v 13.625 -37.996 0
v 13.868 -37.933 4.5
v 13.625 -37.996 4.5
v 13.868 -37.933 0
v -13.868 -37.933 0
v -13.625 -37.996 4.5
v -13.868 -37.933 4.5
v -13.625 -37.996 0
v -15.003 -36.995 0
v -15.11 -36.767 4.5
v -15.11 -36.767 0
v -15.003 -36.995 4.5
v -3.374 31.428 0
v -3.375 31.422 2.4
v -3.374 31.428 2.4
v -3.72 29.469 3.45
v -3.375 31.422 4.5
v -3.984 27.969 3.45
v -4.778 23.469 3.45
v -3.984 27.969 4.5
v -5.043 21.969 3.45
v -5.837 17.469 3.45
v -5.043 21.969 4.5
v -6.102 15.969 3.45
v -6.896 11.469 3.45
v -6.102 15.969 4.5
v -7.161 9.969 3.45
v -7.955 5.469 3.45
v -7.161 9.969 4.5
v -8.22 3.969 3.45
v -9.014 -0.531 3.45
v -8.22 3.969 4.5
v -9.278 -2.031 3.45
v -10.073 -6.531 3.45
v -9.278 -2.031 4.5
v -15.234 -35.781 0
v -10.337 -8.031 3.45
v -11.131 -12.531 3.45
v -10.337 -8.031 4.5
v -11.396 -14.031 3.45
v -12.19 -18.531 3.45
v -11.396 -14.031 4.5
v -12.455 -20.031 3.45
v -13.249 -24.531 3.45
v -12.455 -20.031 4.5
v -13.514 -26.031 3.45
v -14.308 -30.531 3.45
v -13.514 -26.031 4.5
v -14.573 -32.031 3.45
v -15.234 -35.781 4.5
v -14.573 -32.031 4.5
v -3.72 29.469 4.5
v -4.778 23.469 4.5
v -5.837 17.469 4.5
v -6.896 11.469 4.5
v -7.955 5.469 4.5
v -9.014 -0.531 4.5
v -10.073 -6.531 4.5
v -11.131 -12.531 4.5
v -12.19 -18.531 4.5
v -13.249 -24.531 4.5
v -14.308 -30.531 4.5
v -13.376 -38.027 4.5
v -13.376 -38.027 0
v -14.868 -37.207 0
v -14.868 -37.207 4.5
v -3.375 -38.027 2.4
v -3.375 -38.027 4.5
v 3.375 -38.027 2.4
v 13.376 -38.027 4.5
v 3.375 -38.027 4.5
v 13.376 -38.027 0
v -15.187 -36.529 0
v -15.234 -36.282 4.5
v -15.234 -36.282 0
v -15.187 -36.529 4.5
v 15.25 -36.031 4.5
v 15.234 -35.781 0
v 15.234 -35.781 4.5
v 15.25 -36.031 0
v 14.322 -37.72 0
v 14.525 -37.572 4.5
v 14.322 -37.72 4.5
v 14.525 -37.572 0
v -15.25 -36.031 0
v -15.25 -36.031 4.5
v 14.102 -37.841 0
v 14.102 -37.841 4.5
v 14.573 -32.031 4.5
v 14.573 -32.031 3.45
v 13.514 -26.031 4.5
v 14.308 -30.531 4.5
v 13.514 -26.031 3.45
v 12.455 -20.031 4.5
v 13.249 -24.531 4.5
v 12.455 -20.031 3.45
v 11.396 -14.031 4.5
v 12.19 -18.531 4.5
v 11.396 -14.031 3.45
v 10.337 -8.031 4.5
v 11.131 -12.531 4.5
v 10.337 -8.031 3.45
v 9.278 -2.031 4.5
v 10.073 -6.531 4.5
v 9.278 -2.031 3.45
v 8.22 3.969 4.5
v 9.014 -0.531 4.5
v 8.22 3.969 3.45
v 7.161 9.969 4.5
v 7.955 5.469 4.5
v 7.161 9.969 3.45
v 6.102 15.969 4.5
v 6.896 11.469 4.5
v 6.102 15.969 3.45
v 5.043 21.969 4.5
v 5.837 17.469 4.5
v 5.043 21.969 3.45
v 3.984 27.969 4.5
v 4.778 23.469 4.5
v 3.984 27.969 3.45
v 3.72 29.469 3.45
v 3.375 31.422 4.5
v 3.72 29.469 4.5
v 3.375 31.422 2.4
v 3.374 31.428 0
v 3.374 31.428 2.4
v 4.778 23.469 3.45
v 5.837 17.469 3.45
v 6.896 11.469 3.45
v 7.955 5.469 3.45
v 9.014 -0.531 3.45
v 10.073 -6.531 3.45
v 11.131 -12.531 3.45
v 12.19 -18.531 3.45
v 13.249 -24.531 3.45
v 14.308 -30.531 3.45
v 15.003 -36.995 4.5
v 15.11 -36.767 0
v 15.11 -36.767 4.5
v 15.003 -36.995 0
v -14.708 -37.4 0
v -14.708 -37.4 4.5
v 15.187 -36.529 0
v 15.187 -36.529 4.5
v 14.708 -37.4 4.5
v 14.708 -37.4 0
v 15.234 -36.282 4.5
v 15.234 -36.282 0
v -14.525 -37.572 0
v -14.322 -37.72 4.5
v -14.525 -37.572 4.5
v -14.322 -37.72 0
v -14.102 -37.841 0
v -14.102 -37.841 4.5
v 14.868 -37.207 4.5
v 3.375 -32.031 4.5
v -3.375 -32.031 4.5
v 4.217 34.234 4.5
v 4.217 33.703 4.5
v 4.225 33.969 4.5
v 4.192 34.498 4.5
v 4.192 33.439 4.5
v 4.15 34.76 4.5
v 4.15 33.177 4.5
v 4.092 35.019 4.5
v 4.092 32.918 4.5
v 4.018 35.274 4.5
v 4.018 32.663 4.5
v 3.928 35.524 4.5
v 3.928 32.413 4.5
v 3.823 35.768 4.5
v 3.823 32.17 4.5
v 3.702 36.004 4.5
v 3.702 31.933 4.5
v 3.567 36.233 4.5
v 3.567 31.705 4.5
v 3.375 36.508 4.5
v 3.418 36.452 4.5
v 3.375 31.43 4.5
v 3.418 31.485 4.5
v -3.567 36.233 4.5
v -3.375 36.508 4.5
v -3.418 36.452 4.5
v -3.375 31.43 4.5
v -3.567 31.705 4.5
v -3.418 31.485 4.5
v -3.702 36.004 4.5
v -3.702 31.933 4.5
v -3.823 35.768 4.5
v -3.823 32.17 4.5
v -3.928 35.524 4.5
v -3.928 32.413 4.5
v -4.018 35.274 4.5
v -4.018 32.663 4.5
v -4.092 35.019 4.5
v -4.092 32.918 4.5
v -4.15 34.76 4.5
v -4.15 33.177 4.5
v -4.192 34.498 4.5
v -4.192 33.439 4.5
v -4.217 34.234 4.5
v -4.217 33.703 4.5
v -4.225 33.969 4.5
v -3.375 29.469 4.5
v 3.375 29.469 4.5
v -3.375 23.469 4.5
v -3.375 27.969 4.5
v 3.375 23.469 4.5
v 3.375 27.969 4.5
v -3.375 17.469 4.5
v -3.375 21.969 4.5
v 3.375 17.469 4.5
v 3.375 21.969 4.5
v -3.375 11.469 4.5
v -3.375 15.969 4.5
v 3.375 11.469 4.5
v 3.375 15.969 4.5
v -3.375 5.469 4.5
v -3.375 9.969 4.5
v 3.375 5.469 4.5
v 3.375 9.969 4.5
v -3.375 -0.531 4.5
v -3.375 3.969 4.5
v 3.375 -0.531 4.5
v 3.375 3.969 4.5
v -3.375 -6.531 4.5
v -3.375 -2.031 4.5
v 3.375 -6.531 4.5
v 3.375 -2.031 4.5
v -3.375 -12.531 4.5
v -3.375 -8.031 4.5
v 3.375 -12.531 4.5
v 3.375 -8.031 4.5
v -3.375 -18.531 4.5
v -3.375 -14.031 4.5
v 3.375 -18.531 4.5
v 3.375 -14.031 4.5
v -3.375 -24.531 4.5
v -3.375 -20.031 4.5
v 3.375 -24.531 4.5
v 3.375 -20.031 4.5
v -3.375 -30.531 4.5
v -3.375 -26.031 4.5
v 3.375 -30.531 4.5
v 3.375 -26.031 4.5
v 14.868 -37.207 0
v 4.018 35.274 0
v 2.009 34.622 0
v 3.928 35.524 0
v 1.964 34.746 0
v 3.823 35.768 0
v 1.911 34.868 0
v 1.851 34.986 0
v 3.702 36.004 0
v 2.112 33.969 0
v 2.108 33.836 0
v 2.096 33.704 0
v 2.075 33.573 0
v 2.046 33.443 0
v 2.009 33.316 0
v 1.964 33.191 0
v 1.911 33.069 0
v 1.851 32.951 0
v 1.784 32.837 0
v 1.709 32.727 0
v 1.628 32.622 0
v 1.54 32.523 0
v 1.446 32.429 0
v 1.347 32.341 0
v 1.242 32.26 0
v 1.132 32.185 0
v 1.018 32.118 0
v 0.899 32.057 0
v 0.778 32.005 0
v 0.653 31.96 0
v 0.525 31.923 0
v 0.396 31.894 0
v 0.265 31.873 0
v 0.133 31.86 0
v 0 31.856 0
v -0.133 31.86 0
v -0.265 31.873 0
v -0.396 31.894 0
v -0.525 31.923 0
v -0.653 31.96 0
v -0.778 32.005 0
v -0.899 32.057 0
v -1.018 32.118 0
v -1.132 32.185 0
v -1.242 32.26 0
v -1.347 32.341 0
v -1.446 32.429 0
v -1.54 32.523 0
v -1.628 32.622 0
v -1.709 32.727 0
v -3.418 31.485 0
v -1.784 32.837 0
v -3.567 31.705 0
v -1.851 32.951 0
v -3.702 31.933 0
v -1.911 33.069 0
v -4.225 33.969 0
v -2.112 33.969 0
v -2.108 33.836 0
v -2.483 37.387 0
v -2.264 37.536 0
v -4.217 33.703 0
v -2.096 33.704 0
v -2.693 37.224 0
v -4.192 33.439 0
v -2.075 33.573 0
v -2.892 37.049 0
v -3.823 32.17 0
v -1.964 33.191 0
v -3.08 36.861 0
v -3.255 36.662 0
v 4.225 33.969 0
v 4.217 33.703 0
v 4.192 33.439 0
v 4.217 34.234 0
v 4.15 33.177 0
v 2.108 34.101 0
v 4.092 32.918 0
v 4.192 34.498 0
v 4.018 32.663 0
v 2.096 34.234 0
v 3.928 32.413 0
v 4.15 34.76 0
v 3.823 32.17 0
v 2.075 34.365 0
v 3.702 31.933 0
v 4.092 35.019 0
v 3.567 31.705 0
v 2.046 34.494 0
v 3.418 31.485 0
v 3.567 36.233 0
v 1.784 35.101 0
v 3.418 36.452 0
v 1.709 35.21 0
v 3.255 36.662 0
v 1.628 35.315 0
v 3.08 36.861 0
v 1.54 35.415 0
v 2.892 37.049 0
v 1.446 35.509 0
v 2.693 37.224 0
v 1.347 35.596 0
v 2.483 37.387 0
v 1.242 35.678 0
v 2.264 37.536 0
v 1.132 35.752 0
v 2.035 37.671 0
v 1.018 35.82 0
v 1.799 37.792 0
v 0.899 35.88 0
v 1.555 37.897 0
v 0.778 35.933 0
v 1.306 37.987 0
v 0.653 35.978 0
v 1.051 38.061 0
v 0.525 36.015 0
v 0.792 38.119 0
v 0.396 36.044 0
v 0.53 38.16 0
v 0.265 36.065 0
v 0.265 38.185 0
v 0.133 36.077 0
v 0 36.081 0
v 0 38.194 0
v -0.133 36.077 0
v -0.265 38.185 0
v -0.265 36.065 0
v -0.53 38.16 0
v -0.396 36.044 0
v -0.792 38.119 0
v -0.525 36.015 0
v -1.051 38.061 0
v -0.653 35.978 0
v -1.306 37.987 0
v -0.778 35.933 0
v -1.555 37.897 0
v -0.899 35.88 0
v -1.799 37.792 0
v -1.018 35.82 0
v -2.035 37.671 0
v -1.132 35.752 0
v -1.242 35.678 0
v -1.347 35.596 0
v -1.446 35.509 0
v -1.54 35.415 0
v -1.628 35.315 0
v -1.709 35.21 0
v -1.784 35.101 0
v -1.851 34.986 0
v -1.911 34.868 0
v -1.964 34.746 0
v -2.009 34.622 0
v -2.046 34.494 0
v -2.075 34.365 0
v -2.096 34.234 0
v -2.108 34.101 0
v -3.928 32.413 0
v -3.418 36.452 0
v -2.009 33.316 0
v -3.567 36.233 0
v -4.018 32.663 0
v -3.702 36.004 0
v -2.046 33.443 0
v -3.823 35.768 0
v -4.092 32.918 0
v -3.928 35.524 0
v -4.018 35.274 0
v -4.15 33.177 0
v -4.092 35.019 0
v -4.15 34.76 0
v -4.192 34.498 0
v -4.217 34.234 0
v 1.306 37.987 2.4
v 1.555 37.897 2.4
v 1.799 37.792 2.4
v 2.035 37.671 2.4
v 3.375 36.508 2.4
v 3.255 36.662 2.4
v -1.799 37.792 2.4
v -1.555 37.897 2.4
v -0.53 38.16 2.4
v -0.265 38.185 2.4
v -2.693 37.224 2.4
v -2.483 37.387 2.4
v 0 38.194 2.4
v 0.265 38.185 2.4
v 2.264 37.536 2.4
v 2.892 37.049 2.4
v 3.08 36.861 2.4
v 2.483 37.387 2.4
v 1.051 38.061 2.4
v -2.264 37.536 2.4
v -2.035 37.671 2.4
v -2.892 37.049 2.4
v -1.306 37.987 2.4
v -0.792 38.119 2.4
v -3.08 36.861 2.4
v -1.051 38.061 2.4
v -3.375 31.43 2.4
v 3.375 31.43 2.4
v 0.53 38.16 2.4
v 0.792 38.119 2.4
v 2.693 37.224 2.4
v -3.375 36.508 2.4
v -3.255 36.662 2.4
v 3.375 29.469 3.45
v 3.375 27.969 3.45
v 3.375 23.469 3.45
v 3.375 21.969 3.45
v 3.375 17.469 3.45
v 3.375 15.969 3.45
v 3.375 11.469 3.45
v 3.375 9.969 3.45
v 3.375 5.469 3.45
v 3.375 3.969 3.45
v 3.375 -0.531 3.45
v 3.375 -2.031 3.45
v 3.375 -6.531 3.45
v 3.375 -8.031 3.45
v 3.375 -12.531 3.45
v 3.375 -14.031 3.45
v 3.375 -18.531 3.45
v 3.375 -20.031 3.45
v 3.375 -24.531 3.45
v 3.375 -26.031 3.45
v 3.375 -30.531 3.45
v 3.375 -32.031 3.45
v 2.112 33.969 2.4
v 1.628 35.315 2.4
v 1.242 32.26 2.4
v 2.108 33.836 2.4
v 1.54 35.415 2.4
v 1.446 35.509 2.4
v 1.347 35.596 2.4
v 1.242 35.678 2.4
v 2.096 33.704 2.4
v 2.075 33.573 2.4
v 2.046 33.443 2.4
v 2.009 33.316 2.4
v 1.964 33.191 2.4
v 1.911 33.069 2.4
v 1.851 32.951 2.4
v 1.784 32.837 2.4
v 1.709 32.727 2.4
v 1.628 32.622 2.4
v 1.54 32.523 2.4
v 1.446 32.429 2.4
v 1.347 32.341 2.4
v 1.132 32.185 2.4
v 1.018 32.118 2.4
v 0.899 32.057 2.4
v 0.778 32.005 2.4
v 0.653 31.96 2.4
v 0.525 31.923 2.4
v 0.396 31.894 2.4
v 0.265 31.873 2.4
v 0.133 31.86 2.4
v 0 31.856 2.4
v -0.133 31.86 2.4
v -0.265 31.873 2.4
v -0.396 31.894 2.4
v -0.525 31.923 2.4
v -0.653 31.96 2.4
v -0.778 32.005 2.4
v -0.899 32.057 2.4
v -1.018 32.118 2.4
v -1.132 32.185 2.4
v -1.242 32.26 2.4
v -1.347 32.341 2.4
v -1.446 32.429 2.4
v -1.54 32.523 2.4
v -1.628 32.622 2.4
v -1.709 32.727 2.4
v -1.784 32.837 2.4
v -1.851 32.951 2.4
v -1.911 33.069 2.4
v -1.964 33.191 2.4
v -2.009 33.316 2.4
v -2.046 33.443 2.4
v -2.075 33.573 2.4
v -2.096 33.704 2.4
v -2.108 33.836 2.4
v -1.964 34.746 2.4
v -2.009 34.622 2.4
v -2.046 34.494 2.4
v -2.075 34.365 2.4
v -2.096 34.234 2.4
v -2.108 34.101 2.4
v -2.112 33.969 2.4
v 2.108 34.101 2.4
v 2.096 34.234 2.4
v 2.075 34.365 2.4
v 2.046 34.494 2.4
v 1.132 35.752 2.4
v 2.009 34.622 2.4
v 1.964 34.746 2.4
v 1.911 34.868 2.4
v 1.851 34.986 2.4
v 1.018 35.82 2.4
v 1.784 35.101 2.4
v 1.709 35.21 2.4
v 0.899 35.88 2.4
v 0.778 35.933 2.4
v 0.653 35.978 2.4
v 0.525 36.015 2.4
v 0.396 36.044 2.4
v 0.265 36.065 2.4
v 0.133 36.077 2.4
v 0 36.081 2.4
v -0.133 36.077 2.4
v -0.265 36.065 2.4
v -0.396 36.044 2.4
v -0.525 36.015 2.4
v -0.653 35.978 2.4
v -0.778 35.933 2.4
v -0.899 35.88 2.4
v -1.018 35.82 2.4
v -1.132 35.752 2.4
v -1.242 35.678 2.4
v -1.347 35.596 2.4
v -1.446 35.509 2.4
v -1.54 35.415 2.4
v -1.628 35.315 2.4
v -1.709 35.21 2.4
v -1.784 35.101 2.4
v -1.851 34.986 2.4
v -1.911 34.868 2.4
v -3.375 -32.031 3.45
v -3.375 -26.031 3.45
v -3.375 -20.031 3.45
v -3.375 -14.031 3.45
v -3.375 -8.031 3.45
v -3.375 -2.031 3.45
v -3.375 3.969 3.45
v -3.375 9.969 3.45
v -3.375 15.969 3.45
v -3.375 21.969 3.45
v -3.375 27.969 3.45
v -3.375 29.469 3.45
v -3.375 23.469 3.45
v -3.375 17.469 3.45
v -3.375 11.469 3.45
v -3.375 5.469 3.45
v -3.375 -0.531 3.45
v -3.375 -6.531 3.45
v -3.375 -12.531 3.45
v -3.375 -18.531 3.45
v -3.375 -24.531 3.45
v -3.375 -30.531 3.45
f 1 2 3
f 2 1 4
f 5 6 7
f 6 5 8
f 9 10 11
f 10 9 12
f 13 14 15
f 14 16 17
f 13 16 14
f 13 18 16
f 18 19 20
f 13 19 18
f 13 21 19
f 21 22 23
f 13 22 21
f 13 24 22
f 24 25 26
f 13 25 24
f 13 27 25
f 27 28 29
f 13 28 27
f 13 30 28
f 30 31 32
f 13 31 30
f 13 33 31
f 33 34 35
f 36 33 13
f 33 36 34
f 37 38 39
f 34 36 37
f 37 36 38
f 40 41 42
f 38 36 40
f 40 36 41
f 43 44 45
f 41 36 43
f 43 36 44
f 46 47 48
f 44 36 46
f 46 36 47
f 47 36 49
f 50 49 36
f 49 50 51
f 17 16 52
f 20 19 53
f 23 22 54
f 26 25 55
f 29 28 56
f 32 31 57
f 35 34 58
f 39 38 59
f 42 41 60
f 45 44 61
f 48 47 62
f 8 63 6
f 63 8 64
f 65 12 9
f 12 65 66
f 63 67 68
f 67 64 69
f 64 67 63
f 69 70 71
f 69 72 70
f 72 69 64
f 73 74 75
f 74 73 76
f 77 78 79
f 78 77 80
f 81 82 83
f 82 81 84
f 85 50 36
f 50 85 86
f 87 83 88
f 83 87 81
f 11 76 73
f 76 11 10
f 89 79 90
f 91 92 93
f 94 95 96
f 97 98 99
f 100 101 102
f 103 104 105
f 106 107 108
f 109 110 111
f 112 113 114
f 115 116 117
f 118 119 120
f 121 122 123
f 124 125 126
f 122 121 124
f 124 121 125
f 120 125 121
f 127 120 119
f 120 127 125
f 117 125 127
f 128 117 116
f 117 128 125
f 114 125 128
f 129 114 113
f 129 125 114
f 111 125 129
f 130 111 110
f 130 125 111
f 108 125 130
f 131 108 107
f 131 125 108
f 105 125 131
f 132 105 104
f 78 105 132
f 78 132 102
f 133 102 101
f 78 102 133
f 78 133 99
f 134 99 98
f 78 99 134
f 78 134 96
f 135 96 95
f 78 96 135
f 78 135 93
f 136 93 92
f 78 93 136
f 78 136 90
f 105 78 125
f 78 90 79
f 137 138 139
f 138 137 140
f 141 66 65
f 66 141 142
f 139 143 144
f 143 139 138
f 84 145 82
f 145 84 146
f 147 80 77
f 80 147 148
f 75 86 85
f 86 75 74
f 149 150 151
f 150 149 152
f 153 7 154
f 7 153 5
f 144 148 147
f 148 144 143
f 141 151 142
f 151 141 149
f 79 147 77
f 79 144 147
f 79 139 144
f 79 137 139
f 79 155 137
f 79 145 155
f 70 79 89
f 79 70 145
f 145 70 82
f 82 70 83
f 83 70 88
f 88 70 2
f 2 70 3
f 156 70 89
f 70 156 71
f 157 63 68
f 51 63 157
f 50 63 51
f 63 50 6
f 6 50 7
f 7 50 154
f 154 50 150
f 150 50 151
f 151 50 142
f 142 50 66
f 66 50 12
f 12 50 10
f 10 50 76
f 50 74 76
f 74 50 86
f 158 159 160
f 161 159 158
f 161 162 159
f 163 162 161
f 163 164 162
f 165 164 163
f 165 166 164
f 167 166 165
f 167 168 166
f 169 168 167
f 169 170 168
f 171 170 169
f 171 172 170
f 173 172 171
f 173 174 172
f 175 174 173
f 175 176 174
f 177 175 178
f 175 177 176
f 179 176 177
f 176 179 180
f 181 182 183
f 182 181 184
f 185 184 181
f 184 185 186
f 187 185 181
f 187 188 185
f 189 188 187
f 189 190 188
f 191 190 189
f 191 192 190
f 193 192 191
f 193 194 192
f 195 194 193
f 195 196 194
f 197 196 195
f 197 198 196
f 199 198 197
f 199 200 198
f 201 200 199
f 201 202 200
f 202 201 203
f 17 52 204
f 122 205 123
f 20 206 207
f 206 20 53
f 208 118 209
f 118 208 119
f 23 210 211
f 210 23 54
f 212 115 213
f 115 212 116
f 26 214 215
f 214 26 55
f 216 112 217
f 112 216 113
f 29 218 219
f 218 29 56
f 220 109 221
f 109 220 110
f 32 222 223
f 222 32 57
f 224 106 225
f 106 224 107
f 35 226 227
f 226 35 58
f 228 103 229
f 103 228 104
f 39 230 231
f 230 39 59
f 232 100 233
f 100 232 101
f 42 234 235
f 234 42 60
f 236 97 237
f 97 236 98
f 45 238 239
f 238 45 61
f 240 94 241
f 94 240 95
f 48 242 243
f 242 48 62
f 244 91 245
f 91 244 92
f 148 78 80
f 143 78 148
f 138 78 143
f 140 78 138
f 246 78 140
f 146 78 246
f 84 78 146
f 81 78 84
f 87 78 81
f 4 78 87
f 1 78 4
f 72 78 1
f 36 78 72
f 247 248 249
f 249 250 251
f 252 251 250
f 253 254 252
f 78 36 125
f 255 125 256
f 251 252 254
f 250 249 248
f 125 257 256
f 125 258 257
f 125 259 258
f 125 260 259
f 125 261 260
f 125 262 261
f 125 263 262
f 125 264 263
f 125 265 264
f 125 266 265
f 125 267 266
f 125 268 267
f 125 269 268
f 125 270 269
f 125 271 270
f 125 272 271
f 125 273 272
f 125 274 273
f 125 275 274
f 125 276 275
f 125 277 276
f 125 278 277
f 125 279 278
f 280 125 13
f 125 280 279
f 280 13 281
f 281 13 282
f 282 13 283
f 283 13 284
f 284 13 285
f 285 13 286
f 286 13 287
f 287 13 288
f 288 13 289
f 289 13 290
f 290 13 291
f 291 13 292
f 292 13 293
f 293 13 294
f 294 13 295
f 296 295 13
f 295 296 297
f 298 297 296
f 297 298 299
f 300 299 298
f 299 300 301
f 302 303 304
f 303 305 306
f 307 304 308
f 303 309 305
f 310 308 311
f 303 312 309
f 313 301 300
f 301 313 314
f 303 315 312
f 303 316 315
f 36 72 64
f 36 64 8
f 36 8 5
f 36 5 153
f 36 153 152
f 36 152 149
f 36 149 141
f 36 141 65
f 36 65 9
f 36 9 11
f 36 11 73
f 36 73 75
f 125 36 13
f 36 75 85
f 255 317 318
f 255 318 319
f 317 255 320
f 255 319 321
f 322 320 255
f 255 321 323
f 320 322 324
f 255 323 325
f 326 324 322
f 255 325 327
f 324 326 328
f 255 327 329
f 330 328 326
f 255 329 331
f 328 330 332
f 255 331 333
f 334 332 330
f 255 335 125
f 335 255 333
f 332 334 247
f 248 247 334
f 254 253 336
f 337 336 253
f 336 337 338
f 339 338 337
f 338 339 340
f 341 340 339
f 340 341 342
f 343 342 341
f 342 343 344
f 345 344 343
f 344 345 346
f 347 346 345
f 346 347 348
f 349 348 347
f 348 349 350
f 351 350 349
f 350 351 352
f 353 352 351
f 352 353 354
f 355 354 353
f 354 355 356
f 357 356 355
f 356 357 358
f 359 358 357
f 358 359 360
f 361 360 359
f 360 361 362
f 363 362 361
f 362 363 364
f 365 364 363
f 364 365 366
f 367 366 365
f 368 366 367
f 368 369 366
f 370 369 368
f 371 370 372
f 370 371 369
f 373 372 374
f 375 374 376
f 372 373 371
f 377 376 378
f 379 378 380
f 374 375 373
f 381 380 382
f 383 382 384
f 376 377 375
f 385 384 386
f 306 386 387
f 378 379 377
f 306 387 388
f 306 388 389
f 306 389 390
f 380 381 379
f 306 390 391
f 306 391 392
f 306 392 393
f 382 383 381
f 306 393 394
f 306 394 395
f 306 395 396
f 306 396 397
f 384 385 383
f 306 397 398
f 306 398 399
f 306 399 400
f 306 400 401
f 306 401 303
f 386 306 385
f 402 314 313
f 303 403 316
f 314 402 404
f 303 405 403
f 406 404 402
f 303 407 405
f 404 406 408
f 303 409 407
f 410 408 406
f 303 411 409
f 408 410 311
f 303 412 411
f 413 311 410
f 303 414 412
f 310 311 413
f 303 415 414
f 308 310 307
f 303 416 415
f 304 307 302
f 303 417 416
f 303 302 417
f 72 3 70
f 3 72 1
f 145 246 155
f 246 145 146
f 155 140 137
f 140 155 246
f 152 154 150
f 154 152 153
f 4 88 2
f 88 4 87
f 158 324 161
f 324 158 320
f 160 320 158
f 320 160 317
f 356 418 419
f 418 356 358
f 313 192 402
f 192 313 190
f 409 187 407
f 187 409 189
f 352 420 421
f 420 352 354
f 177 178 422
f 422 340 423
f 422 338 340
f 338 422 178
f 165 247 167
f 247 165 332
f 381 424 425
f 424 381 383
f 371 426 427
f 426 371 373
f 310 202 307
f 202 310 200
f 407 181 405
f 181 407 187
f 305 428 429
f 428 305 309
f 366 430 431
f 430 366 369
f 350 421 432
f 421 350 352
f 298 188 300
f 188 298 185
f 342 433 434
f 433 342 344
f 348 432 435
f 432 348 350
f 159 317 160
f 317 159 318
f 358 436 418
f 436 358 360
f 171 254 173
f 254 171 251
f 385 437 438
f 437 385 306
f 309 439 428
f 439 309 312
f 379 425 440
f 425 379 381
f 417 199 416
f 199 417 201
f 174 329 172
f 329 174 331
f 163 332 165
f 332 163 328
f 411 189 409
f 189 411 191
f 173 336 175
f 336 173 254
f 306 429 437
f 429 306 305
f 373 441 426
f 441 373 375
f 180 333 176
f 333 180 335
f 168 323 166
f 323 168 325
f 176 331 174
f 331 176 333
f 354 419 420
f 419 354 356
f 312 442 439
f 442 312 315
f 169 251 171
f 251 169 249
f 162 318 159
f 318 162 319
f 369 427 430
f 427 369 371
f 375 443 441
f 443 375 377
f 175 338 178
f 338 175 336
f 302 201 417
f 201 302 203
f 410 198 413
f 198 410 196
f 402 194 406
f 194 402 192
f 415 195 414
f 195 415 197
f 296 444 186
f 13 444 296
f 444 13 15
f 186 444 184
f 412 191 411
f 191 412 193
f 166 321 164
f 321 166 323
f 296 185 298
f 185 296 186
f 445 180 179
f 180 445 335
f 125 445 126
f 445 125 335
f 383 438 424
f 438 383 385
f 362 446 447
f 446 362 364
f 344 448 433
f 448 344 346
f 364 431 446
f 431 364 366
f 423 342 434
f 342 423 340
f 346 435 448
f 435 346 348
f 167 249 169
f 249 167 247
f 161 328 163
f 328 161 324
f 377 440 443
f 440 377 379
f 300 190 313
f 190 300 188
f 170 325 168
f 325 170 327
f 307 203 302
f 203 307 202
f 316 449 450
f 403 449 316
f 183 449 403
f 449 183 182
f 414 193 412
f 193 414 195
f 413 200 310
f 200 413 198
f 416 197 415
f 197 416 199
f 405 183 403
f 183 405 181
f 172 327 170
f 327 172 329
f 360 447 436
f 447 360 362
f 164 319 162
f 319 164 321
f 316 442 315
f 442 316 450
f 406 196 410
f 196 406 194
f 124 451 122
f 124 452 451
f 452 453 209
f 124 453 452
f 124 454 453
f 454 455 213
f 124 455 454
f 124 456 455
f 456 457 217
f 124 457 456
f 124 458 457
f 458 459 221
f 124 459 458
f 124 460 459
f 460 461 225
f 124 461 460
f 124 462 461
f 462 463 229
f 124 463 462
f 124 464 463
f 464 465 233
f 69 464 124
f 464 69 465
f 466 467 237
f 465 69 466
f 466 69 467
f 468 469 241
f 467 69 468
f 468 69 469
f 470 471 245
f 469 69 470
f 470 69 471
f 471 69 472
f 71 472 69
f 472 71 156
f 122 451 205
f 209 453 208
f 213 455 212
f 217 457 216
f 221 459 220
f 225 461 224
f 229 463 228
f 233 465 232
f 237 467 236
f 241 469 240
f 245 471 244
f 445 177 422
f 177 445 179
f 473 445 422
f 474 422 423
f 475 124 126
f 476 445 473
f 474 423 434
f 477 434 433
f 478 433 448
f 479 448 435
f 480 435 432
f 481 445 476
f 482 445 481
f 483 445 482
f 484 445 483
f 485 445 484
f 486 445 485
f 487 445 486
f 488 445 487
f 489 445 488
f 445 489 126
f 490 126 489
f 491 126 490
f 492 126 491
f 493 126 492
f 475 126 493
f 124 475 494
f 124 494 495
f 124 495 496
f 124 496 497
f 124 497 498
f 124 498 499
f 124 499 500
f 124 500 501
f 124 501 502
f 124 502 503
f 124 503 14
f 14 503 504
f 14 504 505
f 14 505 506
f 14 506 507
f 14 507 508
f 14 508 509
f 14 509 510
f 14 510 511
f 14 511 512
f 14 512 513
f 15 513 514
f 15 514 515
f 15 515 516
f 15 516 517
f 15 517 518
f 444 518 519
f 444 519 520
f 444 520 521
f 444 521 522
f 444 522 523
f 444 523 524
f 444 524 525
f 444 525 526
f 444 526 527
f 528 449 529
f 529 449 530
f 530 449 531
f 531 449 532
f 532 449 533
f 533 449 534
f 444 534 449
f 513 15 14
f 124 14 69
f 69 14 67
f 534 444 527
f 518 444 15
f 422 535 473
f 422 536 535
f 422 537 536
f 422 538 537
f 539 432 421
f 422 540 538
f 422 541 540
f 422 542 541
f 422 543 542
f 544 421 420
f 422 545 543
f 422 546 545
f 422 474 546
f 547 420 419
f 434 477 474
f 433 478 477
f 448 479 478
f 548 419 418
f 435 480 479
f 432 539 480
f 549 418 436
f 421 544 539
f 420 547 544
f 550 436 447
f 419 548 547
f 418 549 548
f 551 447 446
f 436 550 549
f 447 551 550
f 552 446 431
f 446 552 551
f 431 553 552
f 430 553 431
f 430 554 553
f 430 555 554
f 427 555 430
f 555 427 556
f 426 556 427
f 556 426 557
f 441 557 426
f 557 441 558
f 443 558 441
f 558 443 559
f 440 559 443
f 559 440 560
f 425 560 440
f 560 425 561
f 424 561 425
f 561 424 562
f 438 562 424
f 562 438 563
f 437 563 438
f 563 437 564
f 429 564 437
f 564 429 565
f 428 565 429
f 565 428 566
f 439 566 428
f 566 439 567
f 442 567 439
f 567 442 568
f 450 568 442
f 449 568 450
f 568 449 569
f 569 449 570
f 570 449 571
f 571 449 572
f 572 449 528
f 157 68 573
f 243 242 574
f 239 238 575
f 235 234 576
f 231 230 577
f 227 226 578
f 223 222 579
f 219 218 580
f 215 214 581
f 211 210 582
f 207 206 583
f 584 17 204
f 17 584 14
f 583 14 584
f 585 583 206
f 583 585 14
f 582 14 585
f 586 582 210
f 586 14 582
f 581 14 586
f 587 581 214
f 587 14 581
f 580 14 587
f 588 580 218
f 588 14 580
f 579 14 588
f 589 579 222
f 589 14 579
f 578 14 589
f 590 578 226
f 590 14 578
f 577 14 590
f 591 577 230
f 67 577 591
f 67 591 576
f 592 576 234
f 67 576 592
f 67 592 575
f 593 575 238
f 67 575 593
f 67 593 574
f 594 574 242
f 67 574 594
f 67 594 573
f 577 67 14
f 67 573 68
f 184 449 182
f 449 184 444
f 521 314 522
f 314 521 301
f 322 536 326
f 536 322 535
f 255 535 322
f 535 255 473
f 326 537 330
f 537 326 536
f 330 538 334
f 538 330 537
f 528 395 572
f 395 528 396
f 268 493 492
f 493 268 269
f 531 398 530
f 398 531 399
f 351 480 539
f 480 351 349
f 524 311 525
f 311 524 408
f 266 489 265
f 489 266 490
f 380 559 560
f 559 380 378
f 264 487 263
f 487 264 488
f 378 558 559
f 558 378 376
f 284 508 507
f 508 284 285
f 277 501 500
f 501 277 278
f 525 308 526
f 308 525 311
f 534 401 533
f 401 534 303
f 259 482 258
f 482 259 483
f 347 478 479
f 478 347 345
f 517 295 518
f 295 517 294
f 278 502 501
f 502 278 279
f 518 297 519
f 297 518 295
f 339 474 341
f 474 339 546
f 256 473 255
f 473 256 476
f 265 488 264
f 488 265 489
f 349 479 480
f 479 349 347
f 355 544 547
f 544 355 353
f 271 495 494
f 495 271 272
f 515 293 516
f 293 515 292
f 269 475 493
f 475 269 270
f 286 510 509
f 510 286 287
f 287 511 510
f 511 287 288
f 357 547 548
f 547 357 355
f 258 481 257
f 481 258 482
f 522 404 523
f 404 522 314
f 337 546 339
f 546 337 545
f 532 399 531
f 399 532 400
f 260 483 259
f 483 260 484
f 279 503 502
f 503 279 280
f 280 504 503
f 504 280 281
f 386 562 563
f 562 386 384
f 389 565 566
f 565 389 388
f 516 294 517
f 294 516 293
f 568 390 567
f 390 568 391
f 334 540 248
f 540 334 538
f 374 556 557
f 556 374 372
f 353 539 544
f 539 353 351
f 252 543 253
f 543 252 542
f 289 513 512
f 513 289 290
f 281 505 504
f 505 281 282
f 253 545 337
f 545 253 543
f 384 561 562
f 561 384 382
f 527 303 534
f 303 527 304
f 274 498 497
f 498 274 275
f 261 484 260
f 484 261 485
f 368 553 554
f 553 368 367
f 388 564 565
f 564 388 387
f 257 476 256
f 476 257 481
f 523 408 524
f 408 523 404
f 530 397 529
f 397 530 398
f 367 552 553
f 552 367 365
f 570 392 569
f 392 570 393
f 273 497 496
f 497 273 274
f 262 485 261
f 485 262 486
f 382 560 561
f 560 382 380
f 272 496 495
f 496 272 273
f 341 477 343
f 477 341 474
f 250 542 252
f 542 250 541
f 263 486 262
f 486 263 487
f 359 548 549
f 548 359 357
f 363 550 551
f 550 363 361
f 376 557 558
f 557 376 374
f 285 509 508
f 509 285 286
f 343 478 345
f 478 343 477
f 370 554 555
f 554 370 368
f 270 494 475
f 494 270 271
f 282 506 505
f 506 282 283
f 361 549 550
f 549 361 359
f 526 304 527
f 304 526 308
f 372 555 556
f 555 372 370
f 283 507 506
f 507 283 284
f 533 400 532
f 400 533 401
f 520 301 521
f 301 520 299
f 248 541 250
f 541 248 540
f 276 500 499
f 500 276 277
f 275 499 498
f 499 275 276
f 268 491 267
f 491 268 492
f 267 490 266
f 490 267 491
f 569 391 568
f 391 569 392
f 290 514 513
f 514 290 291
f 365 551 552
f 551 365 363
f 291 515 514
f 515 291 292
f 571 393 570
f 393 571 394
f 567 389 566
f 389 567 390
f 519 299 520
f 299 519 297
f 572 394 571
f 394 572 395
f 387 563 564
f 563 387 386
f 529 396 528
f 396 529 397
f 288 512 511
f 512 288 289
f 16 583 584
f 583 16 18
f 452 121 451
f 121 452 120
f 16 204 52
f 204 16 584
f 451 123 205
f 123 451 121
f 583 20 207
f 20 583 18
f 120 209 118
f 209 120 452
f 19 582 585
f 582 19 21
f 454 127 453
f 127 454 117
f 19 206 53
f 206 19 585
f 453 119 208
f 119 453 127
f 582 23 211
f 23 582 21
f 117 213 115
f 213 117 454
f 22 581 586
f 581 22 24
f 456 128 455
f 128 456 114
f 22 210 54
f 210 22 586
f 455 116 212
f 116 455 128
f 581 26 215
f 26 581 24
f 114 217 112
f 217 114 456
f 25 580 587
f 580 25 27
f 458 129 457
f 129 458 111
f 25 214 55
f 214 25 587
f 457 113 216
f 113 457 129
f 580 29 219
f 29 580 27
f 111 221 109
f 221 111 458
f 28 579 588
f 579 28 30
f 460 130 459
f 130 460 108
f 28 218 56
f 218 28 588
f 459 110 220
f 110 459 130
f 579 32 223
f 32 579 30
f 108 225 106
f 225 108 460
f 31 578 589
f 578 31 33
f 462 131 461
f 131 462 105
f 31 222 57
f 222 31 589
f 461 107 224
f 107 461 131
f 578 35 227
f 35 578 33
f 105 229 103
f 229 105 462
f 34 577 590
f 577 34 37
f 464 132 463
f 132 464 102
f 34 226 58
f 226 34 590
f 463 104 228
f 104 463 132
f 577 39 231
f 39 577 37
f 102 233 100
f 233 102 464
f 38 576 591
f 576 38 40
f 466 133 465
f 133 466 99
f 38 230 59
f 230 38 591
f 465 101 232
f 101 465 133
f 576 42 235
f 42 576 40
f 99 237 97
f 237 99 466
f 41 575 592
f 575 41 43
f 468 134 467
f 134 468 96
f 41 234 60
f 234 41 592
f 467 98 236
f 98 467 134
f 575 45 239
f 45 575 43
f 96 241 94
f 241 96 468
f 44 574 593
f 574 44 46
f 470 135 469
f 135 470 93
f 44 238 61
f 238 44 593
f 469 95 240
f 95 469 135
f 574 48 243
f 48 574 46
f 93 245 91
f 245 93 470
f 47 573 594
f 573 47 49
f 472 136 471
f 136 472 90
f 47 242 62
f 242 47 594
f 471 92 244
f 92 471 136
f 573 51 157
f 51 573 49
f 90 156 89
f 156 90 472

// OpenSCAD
// Generate a resistor/diode lead bending tool
// Dan Newman, dan dot newman @ mtbaldy dot us
// 30 June 2012

// Slicing layer height
layer_height = 0.3;

// spacing between each position
spacing = 6.0;

// Diameter of resistor leads
wire_d = 1.50;

// ---------------------
// Short/small resistors

// First bending width
start_w = 10;

// Final bending width
end_w = 30;
//end_w = 40; // Nice long bender, but too long for a 10 x 10 cm build area

// Steps between each bending width
step_w = 2;

// Width and depth of the trough/ditch to place the resistors in
trough_w = 6.75;
trough_d = 2.10;

// -----------------------
// Medium sized resistors

// First bending width
//start_w = 16;

// Final bending width
//end_w = 30;
//end_w = 40; // Nice long bender, but too long for a 10 x 10 cm build area

// Steps between each bending width
//step_w = 2;

// Width and depth of the trough/ditch to place the resistors in
//trough_w = 10.5;
//trough_d = 3.00;

// -------------
// Miscellaneous

// Corner radius for corners of the plate
corner_r = 2.0;


// -----------------------
// Derived values follow

// Thickness of the tool
thickness = 2 * trough_d;

// Round up to the nearest multiple of a layer height
H = thickness + layer_height*(1.0+floor(thickness/layer_height)-(thickness/layer_height));

// Number of positions
N = ceil( 1 + ( end_w - start_w ) / step_w );

// Starting and ending slot widths with allowances for the wire diameters
W_1 = start_w - wire_d;
W_N = end_w   - wire_d;

// To determine the actual starting and ending widths, consider the
// line segment drawn between the first slot of width W_1 and the final
// slot of width W_N and spaced (N-1)*spacing away.
P1 = [W_1 / 2, (N - 1)*spacing];
P2 = [W_N / 2, 0];

// We wish to find the X coordinates X0 and X3 of the points
//
//   P0 = [X0, N * spacing]
//   P3 = [X3, -spacing]
//
// on the line through P1 & P2.  The equation of the line as a function of y is
//
//   L(y) = P2[0] + y * ( P1[0] - P2[0] ) / ( P1[1] - P2[1] ) 
P0 = [P2[0] + N * spacing * ( P1[0] - P2[0] ) / ( P1[1] - P2[1] ), N * spacing];
P3 = [P2[0] - spacing * ( P1[0] - P2[0] ) / ( P1[1] - P2[1] ), -spacing];

// Overall length (we use for centering the piece)
L = P0[1] - P3[1] + P0[0] * 1.25;

module plate()
{
    difference()
    {
        union()
        {
            hull()
            {
                 translate([P0[0] - corner_r, P0[1] - corner_r, 0])
                     cylinder(h=H, r=corner_r, center=false, $fn=50);
                 translate([-P0[0] + corner_r, P0[1] - corner_r, 0])
                     cylinder(h=H, r=corner_r, center=false, $fn=50);
                 translate([P3[0] - corner_r, P3[1] + corner_r, 0])
                     cylinder(h=H, r=corner_r, center=false, $fn=50);
                 translate([-P3[0] + corner_r, P3[1] + corner_r, 0])
                     cylinder(h=H, r=corner_r, center=false, $fn=50);
            }
            translate([0, P0[1], 0])
                 cylinder(h=H, r=P0[0]*1.3, center=false, $fn=100);
        }
        translate([-trough_w/2, -2*spacing, H - trough_d])
            cube([trough_w, (N + 4) * spacing, H]);
        translate([0, P0[1], -(H+1)/2])
            cylinder(h=H+1, r=P0[0]*1.3/2, center=false, $fn=100);
    }
}

module slot(n)
{
	translate([-P3[0], P1[1] - n*spacing, H - trough_d/2])
      cube([P3[0]*2, wire_d, H]);
}

translate([0, -(L/2 + P3[1]), 0]) difference()
{
    plate();
    for (n = [0 : N-1])
    {
        slot(n);
    }
}
